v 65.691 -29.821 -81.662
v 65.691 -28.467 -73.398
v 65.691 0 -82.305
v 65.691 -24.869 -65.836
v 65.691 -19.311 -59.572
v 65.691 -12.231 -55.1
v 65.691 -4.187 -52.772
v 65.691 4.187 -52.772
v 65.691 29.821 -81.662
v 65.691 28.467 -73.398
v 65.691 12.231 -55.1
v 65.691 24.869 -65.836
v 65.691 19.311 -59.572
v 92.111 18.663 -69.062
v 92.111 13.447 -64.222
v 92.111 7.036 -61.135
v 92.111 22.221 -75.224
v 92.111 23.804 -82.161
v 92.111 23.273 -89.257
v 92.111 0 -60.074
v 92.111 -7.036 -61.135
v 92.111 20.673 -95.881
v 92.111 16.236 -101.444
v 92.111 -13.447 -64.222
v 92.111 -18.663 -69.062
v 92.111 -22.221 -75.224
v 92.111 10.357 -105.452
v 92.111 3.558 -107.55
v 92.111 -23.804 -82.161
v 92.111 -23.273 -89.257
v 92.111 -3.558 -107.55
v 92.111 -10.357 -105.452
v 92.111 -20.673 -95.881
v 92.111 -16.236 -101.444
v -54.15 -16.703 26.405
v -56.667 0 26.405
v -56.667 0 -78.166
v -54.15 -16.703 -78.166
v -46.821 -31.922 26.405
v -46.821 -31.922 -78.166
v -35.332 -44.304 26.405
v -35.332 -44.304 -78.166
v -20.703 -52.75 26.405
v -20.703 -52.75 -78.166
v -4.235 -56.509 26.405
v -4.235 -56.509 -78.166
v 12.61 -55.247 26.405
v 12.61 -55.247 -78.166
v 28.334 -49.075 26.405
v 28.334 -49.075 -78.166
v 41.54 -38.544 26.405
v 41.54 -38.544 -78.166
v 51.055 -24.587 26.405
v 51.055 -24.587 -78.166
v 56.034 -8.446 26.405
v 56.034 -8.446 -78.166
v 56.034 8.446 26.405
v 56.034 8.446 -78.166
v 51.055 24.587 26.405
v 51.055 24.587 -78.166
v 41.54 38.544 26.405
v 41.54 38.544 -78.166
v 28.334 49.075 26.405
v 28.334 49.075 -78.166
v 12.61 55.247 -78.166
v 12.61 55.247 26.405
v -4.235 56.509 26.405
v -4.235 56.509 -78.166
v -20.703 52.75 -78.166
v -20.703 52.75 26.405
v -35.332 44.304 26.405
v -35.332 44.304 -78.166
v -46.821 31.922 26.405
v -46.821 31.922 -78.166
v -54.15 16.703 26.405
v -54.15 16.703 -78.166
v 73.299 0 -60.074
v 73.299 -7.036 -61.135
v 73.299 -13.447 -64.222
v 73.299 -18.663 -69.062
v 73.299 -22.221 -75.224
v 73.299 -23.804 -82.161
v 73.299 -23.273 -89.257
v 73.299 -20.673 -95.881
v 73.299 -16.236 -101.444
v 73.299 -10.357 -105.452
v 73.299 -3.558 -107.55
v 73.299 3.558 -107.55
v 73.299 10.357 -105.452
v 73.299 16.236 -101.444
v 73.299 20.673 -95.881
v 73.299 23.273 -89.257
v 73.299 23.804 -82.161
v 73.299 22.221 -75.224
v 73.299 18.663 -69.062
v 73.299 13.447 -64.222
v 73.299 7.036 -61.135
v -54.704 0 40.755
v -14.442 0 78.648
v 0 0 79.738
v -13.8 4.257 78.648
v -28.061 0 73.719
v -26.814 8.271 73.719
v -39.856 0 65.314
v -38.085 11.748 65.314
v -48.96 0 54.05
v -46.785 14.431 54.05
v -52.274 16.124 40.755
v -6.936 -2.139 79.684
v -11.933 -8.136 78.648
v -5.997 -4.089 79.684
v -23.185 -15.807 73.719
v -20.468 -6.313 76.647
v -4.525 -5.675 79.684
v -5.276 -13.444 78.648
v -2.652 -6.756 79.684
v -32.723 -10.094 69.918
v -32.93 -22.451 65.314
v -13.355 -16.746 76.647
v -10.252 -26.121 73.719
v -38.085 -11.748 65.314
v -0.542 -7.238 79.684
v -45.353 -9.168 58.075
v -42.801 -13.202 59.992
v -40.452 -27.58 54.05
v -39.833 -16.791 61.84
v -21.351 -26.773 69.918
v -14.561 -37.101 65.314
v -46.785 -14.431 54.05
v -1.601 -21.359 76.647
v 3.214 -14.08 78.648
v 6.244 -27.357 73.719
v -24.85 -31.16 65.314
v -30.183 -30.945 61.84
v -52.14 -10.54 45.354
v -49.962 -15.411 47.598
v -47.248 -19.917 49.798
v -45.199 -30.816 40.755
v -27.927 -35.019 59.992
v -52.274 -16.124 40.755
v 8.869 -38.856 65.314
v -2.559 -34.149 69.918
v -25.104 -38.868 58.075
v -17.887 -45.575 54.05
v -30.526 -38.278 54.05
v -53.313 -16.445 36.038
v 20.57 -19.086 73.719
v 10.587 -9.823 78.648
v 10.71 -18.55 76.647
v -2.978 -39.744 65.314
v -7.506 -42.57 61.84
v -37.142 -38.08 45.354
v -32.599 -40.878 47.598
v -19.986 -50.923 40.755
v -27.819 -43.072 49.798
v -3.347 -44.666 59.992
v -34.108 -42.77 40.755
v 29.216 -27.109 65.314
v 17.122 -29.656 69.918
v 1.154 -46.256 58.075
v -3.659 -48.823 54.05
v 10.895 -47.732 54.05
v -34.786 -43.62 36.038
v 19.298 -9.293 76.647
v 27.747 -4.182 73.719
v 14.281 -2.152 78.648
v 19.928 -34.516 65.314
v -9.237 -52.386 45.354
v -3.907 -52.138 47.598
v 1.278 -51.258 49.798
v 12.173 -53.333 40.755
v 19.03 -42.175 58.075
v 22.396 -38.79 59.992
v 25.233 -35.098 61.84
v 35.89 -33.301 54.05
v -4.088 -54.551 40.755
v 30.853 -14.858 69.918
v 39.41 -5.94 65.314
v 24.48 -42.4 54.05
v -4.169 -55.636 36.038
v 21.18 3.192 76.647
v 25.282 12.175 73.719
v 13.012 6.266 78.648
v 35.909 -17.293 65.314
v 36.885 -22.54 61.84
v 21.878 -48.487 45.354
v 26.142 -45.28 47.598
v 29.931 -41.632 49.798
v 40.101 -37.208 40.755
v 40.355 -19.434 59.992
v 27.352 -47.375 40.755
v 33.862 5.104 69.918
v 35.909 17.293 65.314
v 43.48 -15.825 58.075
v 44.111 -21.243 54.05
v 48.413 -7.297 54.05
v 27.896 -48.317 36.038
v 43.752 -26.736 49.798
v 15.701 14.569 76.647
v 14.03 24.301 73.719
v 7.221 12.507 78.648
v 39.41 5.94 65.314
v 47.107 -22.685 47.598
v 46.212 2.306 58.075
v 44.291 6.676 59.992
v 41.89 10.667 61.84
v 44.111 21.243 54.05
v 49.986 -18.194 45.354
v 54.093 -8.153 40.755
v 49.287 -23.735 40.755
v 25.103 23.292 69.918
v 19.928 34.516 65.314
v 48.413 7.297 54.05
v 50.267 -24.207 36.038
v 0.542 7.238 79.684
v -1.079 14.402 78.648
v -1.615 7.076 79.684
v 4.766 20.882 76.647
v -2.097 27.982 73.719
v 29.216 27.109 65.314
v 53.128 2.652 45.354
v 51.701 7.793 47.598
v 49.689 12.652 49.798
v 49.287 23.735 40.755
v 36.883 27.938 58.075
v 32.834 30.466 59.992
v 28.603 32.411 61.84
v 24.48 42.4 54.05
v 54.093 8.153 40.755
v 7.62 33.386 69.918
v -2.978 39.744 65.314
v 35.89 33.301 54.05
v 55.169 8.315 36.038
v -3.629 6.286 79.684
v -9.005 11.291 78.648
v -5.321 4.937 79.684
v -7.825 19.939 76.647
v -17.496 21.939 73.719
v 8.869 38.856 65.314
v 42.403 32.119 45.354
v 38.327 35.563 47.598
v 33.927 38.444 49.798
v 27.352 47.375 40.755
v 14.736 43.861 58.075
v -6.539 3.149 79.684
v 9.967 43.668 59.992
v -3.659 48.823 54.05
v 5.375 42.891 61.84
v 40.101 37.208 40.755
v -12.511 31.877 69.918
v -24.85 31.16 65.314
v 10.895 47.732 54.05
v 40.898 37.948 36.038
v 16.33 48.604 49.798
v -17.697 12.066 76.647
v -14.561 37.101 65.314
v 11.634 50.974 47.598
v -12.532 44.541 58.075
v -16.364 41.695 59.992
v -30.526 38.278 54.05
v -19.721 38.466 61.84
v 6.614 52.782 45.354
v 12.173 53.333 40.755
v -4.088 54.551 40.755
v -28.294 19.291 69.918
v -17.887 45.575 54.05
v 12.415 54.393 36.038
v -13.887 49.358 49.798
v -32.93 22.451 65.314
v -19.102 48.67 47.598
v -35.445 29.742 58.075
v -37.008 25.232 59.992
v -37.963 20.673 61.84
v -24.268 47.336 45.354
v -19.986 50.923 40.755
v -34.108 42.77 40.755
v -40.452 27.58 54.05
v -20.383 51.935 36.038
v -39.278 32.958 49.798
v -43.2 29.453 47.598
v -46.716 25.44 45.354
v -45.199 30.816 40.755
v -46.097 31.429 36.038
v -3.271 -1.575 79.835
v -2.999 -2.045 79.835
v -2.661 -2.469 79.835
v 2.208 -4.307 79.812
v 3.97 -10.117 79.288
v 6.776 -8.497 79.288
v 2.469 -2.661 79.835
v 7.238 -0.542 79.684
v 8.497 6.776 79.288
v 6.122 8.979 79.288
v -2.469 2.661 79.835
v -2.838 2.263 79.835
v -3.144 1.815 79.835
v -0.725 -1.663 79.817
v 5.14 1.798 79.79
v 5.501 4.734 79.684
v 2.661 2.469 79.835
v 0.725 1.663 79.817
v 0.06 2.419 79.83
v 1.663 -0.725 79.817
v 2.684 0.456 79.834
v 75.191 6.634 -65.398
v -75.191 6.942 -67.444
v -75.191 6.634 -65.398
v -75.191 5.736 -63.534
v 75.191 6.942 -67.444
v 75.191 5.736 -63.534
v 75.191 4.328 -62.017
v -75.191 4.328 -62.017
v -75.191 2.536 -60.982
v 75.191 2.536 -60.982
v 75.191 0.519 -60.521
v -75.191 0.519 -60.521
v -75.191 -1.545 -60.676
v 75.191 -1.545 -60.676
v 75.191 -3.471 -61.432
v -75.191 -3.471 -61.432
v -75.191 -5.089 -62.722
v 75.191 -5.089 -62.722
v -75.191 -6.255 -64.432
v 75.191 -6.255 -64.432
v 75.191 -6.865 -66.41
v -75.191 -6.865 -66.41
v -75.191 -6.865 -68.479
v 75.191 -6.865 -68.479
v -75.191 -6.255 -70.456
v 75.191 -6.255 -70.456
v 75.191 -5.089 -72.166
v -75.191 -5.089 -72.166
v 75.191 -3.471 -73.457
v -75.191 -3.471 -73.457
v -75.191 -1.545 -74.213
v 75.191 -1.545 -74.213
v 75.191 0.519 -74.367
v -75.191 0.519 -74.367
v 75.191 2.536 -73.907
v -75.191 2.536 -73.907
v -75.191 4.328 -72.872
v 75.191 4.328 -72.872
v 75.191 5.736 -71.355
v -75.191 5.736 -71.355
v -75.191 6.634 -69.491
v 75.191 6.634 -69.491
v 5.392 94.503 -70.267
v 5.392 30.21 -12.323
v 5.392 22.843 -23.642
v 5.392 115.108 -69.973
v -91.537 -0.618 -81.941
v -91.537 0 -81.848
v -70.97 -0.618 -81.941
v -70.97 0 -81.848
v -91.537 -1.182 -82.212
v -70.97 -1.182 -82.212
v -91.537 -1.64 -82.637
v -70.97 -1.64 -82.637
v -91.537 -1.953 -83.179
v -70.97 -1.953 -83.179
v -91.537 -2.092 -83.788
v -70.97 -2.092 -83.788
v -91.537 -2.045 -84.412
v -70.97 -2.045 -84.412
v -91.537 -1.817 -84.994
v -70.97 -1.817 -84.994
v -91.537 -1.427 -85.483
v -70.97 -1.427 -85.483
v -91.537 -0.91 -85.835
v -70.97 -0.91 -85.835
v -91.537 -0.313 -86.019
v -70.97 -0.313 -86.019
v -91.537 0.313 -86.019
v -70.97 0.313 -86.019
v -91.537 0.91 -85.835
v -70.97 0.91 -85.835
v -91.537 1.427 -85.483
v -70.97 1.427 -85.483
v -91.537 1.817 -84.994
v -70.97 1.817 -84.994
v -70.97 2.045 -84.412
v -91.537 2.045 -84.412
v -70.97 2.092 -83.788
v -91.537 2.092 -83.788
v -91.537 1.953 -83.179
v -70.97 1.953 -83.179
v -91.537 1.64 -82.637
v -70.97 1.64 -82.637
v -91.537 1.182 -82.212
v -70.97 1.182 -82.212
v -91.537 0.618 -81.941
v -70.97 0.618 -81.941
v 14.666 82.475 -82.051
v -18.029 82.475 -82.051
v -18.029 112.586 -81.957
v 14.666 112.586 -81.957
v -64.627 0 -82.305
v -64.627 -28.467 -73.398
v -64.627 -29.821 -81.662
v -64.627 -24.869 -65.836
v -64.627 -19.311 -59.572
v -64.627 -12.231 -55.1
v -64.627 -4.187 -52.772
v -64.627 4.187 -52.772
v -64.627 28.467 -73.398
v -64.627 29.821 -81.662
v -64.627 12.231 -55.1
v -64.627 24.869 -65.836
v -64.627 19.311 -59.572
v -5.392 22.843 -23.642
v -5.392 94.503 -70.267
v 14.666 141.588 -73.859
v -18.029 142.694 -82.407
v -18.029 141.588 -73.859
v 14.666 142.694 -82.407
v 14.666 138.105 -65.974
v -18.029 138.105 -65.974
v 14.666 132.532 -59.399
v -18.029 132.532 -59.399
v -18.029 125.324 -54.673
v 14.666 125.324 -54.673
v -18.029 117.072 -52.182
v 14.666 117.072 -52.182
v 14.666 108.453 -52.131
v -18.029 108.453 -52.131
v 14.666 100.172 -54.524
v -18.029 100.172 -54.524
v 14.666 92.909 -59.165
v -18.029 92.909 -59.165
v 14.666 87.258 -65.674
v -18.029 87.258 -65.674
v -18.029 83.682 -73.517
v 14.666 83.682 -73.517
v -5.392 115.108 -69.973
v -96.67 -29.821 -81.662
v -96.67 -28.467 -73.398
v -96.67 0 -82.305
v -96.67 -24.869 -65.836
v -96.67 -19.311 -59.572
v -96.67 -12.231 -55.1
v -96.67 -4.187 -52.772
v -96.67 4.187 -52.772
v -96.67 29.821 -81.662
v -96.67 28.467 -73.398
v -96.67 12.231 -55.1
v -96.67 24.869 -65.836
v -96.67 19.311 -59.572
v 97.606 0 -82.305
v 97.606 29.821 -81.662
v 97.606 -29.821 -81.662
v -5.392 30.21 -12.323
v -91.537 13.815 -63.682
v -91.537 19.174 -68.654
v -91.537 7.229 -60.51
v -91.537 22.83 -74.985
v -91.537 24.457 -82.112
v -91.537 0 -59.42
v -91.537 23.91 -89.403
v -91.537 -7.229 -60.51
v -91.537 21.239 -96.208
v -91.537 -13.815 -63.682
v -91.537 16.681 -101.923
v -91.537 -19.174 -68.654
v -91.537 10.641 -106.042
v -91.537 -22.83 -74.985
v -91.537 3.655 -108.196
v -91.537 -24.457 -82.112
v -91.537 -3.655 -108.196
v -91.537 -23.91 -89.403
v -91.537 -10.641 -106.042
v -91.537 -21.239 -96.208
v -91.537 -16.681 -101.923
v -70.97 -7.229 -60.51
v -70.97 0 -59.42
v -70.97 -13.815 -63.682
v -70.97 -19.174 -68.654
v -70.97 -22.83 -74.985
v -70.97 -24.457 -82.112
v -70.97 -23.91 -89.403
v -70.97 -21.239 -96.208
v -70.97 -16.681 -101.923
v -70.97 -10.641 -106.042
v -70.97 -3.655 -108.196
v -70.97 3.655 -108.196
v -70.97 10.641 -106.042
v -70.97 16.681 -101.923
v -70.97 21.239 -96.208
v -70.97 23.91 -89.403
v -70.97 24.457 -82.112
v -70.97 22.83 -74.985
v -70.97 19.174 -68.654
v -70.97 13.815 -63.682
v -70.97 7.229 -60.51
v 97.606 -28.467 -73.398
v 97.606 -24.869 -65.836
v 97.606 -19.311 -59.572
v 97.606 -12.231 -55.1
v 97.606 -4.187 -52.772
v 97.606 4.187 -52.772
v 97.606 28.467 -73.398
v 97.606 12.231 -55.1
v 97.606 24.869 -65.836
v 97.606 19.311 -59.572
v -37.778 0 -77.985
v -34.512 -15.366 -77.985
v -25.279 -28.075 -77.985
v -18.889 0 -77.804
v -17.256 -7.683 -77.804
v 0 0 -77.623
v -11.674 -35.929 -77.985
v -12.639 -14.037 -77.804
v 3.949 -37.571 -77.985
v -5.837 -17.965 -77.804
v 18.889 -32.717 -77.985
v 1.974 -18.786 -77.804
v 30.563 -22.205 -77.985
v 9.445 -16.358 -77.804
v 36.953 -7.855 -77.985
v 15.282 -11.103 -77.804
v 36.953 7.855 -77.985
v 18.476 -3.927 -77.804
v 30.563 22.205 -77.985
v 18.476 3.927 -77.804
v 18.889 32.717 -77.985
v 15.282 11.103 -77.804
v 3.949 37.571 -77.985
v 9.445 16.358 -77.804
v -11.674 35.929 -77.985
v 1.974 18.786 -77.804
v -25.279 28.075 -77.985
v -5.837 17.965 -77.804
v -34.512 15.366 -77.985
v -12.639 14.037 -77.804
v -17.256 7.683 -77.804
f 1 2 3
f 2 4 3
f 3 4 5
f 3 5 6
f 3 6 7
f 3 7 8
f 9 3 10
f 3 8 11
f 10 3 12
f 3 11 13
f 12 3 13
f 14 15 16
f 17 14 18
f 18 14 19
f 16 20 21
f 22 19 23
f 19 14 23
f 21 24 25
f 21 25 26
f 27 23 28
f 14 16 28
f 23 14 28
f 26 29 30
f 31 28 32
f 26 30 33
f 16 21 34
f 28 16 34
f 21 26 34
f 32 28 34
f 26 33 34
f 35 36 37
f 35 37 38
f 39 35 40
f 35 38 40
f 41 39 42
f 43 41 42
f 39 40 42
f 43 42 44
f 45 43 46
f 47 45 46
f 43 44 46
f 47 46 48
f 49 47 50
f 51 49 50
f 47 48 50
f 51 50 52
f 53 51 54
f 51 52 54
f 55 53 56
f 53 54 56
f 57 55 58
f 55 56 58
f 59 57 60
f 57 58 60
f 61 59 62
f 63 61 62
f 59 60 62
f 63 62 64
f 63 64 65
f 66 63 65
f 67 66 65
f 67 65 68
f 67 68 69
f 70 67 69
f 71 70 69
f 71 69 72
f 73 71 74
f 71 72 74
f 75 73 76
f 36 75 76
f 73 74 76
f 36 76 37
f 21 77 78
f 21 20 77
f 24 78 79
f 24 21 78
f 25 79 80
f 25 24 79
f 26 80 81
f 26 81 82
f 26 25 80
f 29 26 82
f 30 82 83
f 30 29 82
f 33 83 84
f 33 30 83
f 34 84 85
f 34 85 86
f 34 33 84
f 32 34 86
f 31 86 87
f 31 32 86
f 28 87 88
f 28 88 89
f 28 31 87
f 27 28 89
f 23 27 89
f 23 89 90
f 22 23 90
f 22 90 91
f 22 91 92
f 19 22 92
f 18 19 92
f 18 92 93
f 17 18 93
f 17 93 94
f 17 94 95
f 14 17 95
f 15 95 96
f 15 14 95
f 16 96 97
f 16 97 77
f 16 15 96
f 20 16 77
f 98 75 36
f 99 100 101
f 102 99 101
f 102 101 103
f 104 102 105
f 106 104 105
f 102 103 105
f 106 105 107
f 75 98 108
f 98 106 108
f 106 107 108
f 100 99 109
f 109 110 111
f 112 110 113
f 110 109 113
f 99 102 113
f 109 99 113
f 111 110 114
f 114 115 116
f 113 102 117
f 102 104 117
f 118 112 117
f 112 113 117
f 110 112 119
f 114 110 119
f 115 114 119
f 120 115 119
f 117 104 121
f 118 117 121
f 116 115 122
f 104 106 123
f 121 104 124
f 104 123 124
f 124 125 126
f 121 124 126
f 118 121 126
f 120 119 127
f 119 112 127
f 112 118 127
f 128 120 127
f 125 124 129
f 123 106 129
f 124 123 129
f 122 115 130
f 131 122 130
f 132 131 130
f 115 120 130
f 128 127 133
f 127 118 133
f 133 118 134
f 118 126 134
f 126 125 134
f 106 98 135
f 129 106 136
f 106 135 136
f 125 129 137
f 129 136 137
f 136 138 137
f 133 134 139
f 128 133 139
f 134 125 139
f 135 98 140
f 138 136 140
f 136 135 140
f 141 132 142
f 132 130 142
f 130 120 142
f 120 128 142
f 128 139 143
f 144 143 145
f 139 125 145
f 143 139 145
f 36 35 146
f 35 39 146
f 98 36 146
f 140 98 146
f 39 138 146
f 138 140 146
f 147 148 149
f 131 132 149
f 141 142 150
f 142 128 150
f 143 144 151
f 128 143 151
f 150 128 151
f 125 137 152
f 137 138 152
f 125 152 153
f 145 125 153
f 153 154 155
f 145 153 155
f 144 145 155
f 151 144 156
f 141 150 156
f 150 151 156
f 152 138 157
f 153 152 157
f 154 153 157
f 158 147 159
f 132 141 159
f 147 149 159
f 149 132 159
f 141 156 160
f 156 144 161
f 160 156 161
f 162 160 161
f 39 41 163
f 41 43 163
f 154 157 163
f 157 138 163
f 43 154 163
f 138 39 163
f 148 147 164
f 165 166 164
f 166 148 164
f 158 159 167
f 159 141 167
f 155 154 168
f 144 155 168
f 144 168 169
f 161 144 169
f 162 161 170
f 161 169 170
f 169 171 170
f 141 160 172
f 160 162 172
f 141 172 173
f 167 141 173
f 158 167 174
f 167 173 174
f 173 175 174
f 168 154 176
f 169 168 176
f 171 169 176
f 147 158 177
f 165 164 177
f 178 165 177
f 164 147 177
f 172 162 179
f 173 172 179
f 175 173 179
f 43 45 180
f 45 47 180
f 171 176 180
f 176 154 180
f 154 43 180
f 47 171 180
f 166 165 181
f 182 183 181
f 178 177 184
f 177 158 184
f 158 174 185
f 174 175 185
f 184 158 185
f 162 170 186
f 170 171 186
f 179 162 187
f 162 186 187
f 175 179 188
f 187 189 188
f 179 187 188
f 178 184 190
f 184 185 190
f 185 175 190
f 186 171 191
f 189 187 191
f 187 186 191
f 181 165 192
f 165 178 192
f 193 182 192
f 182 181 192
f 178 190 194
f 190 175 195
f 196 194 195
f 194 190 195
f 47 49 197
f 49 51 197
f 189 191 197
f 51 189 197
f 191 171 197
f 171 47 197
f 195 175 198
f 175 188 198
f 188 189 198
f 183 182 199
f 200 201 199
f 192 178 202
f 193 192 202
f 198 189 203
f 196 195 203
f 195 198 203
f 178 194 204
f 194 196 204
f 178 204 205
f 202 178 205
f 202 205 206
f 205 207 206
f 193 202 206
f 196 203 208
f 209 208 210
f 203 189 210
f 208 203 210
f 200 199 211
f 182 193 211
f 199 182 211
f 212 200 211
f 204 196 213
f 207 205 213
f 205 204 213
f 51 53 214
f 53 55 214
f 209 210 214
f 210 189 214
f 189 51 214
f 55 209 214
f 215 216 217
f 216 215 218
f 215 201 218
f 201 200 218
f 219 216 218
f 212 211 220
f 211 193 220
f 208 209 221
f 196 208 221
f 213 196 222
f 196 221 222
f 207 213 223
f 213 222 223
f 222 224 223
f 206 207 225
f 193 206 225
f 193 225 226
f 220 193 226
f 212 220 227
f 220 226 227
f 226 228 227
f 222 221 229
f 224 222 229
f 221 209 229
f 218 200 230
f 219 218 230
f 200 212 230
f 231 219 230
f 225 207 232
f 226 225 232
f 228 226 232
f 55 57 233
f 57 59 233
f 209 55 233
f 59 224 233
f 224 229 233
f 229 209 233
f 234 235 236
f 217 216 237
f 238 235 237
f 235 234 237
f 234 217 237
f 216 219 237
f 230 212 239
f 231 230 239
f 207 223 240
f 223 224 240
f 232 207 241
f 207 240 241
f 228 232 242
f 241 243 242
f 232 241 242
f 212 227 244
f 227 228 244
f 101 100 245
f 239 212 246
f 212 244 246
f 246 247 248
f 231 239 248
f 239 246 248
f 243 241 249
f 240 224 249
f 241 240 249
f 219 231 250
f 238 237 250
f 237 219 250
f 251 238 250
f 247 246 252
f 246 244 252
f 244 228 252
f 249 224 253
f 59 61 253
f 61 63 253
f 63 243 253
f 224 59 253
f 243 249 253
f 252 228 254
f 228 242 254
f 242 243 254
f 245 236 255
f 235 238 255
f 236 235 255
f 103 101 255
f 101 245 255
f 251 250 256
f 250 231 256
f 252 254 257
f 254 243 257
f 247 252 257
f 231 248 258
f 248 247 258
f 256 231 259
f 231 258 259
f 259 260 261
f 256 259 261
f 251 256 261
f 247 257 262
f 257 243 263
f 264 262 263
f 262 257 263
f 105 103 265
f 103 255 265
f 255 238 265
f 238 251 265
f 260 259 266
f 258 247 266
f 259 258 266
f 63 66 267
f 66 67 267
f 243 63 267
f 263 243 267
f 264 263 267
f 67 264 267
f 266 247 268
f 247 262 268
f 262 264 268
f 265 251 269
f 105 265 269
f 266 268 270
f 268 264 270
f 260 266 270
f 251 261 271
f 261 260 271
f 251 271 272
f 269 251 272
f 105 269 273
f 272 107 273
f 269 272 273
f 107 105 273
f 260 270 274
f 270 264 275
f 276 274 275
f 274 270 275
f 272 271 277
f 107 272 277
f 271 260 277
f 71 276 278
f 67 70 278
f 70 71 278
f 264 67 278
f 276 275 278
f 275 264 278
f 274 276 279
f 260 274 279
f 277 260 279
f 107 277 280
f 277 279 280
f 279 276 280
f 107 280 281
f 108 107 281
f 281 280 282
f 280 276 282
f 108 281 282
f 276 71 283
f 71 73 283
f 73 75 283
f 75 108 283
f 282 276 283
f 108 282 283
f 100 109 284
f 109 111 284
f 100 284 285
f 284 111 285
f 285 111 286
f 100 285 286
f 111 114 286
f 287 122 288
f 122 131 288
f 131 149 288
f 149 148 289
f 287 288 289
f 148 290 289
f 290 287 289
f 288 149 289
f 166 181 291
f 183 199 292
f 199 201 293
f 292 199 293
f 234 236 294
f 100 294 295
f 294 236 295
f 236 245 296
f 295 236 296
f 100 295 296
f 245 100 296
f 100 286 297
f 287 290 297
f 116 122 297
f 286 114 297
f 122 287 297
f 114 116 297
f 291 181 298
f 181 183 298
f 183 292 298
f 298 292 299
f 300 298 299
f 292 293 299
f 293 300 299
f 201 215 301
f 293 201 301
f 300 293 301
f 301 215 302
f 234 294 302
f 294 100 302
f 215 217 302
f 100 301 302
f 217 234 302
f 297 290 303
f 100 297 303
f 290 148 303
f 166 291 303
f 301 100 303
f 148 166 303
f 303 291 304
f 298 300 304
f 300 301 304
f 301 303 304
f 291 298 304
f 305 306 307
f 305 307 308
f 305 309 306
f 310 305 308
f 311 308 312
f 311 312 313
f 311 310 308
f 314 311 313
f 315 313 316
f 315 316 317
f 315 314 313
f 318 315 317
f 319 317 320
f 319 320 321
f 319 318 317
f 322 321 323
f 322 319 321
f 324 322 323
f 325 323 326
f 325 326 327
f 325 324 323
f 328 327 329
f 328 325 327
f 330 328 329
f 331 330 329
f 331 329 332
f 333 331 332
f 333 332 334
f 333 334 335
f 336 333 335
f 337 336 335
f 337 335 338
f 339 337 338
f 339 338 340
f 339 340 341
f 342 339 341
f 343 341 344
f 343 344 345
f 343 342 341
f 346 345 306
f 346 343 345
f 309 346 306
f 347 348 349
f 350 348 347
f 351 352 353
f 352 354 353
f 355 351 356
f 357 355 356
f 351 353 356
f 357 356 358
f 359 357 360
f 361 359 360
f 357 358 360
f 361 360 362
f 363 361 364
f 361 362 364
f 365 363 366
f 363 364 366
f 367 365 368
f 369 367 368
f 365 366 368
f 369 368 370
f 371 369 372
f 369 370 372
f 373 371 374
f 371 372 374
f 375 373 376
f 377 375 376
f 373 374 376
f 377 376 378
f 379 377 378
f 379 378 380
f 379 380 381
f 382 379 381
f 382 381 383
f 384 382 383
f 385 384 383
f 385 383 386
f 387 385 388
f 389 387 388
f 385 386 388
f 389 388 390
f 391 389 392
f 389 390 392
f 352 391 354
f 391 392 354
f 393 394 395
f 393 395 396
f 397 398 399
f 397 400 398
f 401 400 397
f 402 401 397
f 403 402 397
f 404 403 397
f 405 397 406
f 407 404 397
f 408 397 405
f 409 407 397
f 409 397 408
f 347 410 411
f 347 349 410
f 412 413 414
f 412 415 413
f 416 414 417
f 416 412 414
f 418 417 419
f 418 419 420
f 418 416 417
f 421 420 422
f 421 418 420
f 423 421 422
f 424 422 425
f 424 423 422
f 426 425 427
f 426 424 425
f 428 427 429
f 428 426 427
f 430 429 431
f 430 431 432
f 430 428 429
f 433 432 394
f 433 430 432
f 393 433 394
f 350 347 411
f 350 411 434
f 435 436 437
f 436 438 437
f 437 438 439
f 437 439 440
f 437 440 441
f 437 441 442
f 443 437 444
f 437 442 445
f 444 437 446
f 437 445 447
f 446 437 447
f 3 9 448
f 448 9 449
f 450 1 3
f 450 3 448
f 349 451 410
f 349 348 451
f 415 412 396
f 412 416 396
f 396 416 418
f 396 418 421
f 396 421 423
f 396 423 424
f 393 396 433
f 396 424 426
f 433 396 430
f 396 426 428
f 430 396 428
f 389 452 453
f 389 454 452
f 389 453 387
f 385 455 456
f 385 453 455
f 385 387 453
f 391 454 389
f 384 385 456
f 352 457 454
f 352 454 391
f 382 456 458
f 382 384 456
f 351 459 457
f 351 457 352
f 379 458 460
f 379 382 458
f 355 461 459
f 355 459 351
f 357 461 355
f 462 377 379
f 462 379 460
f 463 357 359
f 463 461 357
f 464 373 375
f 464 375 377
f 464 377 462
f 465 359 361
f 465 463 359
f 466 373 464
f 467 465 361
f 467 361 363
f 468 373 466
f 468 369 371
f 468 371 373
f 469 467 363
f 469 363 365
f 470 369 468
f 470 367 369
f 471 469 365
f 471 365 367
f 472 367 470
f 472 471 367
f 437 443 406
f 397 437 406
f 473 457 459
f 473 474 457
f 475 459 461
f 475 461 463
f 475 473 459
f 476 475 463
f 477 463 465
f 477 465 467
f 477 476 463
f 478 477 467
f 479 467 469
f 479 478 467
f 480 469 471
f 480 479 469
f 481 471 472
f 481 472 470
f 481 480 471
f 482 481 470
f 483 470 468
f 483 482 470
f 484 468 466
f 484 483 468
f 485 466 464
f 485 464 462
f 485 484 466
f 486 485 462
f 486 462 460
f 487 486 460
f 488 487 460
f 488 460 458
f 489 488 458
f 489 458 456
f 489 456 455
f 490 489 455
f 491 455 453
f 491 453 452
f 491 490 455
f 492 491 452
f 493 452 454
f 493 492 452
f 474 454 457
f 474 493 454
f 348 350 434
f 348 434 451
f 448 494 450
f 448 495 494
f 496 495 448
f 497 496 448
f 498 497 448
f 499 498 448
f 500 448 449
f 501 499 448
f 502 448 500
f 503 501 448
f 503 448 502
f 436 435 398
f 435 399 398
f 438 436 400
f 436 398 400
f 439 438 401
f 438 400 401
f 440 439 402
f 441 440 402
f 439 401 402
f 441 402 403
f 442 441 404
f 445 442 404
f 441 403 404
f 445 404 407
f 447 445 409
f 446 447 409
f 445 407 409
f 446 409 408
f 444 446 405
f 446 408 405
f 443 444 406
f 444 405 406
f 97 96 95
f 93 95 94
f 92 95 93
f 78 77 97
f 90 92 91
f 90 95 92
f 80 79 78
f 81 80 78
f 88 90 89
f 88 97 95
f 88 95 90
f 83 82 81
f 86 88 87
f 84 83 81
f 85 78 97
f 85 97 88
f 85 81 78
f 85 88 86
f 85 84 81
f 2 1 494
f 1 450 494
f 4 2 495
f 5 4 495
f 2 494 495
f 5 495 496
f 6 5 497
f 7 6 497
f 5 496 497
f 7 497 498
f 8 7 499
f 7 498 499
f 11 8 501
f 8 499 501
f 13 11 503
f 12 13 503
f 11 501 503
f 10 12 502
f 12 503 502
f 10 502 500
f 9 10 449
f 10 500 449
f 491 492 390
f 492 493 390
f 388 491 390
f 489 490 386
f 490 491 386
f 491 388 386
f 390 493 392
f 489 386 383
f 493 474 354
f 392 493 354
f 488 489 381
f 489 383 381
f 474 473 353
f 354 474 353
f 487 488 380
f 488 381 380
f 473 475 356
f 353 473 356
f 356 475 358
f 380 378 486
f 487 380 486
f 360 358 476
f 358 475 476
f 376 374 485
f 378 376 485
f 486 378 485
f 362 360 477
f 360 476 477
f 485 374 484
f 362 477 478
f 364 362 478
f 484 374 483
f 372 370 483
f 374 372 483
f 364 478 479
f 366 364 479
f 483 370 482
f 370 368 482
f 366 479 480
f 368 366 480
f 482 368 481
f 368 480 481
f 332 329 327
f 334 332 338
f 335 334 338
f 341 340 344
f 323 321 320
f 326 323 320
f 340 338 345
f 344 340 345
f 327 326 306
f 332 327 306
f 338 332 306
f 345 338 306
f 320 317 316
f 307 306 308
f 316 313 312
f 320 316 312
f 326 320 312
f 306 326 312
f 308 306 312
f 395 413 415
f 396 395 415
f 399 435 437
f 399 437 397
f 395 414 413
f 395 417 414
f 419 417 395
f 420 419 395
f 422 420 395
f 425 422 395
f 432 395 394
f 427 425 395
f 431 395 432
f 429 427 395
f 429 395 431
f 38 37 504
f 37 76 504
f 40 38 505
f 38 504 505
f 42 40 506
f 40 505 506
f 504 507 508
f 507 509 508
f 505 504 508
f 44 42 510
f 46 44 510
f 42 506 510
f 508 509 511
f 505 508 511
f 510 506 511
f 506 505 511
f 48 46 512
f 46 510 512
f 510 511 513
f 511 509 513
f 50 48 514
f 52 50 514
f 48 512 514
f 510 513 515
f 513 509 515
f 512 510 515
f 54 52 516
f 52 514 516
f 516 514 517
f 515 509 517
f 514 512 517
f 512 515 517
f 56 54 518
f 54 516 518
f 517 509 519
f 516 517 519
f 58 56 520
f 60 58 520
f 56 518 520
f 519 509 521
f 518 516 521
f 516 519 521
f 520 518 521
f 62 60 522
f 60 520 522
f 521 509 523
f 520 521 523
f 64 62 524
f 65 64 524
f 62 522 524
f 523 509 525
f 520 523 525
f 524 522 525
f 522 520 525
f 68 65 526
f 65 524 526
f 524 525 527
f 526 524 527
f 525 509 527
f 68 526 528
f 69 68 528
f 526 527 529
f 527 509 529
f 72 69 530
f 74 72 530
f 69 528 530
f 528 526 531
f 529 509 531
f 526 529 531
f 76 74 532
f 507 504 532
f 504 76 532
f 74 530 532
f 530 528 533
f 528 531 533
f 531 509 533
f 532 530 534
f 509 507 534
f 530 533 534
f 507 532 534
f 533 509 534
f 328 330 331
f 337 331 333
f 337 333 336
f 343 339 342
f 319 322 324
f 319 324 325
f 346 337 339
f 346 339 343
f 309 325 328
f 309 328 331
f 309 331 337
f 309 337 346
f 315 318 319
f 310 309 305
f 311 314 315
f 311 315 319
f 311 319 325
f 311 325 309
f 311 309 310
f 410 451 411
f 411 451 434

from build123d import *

# Parameters (mm, degrees)
F2_W          = 32.0429354906
F2_H          = 29.8280566931
F3_ANGLE_BACK = 88.7646603402
F3_ANGLE      = 177.5293206805
F2_W_2        = 31.9146811962
F4_R          = 6.9422785997
F5_DEPTH      = 75.1910284162
F7_W          = 32.6952636242
F7_H          = 30.1112085581
F8_ANGLE_BACK = 90.8560405858
F8_ANGLE      = 181.0352194428
F10_DEPTH     = 5.3917551413
F11_W         = 20.5672681332
F11_H         = 22.4275141954
F11_W_2       = 18.8117921352
F11_H_2       = 23.8710641861


with BuildPart() as f1:
    # F0 (on Front) → F1 (revolve)
    with BuildSketch(Plane.XZ):
        with BuildLine():
            ThreePointArc((0, 79.7378569841), (-39.8556403418, 65.3140028799), (-56.6673278809, 26.4053046703))
            Line((-56.6673278809, 26.4053046703), (-56.6673278809, -78.1663507223))
            Line((-56.6673278809, -78.1663507223), (0, -77.6233673096))
            Line((0, -77.6233673096), (0, 26.4053046703))
            Line((0, 26.4053046703), (0, 79.7378569841))
        make_face()
    revolve(axis=Axis((0, 0, -25.6090313196), (0, 0, 1)))


with BuildPart() as f3:
    # F2 (on Front) → F3 (revolve)
    with BuildSketch(Plane.XZ, mode=Mode.PRIVATE) as f3_sk:
        with Locations((-80.6486681104, -67.3911049962)):
            Rectangle(F2_W, F2_H)
    revolve(f3_sk.sketch.rotate(Axis((-80.6486681104, 0, -82.3051333427), (-1, 0, 0)), -F3_ANGLE_BACK), axis=Axis((-80.6486681104, 0, -82.3051333427), (-1, 0, 0)), revolution_arc=F3_ANGLE)


with BuildPart() as f3b:
    # F2 (on Front) → F3, piece 2 (revolve)
    with BuildSketch(Plane.XZ, mode=Mode.PRIVATE) as f3_sk:
        with Locations((81.6484242678, -67.3911049962)):
            Rectangle(F2_W_2, F2_H)
    revolve(f3_sk.sketch.rotate(Axis((-80.6486681104, 0, -82.3051333427), (-1, 0, 0)), -F3_ANGLE_BACK), axis=Axis((-80.6486681104, 0, -82.3051333427), (-1, 0, 0)), revolution_arc=F3_ANGLE)


with BuildPart() as f5:
    # F4 (on Right) → F5 (new body, symmetric)
    with BuildSketch(Plane.YZ):
        with Locations((0, -67.4443393946)):
            Circle(F4_R)
    extrude(amount=F5_DEPTH, both=True)


with BuildPart() as f8:
    # F7 (on offset) → F8 (revolve)
    with BuildSketch(Plane.XZ.offset(-112.5862151384), mode=Mode.PRIVATE) as f8_sk:
        with Locations((-1.6815513372, -66.9016763568)):
            Rectangle(F7_W, F7_H)
    revolve(f8_sk.sketch.rotate(Axis((-1.6815513372, 112.5862151384, -81.9572806358), (1, 0, 0)), -F8_ANGLE_BACK), axis=Axis((-1.6815513372, 112.5862151384, -81.9572806358), (1, 0, 0)), revolution_arc=F8_ANGLE)


with BuildPart() as f10:
    # F9 (on Right) → F10 (new body, symmetric)
    with BuildSketch(Plane.YZ):
        Polygon((22.8431224823, -23.6423164606), (94.5033729076, -70.2674239874), (115.1084303856, -69.9733197689), (30.2099883556, -12.3226642609), align=None)
    extrude(amount=F10_DEPTH, both=True)


with BuildPart() as f12:
    # F11 (on Front) → F12 (revolve)
    with BuildSketch(Plane.XZ):
        with Locations((-81.2535434961, -70.6338062882)):
            Rectangle(F11_W, F11_H)
    revolve(axis=Axis((82.7046483755, 0, -83.9451551437), (1, 0, 0)))


with BuildPart() as f12b:
    # F11 (on Front) → F12, piece 2 (revolve)
    with BuildSketch(Plane.XZ):
        with Locations((82.7046483755, -72.0096230507)):
            Rectangle(F11_W_2, F11_H_2)
    revolve(axis=Axis((82.7046483755, 0, -83.9451551437), (1, 0, 0)))


solid = Compound([f1.part, f3.part, f3b.part, f5.part, f8.part, f10.part, f12.part, f12b.part])
